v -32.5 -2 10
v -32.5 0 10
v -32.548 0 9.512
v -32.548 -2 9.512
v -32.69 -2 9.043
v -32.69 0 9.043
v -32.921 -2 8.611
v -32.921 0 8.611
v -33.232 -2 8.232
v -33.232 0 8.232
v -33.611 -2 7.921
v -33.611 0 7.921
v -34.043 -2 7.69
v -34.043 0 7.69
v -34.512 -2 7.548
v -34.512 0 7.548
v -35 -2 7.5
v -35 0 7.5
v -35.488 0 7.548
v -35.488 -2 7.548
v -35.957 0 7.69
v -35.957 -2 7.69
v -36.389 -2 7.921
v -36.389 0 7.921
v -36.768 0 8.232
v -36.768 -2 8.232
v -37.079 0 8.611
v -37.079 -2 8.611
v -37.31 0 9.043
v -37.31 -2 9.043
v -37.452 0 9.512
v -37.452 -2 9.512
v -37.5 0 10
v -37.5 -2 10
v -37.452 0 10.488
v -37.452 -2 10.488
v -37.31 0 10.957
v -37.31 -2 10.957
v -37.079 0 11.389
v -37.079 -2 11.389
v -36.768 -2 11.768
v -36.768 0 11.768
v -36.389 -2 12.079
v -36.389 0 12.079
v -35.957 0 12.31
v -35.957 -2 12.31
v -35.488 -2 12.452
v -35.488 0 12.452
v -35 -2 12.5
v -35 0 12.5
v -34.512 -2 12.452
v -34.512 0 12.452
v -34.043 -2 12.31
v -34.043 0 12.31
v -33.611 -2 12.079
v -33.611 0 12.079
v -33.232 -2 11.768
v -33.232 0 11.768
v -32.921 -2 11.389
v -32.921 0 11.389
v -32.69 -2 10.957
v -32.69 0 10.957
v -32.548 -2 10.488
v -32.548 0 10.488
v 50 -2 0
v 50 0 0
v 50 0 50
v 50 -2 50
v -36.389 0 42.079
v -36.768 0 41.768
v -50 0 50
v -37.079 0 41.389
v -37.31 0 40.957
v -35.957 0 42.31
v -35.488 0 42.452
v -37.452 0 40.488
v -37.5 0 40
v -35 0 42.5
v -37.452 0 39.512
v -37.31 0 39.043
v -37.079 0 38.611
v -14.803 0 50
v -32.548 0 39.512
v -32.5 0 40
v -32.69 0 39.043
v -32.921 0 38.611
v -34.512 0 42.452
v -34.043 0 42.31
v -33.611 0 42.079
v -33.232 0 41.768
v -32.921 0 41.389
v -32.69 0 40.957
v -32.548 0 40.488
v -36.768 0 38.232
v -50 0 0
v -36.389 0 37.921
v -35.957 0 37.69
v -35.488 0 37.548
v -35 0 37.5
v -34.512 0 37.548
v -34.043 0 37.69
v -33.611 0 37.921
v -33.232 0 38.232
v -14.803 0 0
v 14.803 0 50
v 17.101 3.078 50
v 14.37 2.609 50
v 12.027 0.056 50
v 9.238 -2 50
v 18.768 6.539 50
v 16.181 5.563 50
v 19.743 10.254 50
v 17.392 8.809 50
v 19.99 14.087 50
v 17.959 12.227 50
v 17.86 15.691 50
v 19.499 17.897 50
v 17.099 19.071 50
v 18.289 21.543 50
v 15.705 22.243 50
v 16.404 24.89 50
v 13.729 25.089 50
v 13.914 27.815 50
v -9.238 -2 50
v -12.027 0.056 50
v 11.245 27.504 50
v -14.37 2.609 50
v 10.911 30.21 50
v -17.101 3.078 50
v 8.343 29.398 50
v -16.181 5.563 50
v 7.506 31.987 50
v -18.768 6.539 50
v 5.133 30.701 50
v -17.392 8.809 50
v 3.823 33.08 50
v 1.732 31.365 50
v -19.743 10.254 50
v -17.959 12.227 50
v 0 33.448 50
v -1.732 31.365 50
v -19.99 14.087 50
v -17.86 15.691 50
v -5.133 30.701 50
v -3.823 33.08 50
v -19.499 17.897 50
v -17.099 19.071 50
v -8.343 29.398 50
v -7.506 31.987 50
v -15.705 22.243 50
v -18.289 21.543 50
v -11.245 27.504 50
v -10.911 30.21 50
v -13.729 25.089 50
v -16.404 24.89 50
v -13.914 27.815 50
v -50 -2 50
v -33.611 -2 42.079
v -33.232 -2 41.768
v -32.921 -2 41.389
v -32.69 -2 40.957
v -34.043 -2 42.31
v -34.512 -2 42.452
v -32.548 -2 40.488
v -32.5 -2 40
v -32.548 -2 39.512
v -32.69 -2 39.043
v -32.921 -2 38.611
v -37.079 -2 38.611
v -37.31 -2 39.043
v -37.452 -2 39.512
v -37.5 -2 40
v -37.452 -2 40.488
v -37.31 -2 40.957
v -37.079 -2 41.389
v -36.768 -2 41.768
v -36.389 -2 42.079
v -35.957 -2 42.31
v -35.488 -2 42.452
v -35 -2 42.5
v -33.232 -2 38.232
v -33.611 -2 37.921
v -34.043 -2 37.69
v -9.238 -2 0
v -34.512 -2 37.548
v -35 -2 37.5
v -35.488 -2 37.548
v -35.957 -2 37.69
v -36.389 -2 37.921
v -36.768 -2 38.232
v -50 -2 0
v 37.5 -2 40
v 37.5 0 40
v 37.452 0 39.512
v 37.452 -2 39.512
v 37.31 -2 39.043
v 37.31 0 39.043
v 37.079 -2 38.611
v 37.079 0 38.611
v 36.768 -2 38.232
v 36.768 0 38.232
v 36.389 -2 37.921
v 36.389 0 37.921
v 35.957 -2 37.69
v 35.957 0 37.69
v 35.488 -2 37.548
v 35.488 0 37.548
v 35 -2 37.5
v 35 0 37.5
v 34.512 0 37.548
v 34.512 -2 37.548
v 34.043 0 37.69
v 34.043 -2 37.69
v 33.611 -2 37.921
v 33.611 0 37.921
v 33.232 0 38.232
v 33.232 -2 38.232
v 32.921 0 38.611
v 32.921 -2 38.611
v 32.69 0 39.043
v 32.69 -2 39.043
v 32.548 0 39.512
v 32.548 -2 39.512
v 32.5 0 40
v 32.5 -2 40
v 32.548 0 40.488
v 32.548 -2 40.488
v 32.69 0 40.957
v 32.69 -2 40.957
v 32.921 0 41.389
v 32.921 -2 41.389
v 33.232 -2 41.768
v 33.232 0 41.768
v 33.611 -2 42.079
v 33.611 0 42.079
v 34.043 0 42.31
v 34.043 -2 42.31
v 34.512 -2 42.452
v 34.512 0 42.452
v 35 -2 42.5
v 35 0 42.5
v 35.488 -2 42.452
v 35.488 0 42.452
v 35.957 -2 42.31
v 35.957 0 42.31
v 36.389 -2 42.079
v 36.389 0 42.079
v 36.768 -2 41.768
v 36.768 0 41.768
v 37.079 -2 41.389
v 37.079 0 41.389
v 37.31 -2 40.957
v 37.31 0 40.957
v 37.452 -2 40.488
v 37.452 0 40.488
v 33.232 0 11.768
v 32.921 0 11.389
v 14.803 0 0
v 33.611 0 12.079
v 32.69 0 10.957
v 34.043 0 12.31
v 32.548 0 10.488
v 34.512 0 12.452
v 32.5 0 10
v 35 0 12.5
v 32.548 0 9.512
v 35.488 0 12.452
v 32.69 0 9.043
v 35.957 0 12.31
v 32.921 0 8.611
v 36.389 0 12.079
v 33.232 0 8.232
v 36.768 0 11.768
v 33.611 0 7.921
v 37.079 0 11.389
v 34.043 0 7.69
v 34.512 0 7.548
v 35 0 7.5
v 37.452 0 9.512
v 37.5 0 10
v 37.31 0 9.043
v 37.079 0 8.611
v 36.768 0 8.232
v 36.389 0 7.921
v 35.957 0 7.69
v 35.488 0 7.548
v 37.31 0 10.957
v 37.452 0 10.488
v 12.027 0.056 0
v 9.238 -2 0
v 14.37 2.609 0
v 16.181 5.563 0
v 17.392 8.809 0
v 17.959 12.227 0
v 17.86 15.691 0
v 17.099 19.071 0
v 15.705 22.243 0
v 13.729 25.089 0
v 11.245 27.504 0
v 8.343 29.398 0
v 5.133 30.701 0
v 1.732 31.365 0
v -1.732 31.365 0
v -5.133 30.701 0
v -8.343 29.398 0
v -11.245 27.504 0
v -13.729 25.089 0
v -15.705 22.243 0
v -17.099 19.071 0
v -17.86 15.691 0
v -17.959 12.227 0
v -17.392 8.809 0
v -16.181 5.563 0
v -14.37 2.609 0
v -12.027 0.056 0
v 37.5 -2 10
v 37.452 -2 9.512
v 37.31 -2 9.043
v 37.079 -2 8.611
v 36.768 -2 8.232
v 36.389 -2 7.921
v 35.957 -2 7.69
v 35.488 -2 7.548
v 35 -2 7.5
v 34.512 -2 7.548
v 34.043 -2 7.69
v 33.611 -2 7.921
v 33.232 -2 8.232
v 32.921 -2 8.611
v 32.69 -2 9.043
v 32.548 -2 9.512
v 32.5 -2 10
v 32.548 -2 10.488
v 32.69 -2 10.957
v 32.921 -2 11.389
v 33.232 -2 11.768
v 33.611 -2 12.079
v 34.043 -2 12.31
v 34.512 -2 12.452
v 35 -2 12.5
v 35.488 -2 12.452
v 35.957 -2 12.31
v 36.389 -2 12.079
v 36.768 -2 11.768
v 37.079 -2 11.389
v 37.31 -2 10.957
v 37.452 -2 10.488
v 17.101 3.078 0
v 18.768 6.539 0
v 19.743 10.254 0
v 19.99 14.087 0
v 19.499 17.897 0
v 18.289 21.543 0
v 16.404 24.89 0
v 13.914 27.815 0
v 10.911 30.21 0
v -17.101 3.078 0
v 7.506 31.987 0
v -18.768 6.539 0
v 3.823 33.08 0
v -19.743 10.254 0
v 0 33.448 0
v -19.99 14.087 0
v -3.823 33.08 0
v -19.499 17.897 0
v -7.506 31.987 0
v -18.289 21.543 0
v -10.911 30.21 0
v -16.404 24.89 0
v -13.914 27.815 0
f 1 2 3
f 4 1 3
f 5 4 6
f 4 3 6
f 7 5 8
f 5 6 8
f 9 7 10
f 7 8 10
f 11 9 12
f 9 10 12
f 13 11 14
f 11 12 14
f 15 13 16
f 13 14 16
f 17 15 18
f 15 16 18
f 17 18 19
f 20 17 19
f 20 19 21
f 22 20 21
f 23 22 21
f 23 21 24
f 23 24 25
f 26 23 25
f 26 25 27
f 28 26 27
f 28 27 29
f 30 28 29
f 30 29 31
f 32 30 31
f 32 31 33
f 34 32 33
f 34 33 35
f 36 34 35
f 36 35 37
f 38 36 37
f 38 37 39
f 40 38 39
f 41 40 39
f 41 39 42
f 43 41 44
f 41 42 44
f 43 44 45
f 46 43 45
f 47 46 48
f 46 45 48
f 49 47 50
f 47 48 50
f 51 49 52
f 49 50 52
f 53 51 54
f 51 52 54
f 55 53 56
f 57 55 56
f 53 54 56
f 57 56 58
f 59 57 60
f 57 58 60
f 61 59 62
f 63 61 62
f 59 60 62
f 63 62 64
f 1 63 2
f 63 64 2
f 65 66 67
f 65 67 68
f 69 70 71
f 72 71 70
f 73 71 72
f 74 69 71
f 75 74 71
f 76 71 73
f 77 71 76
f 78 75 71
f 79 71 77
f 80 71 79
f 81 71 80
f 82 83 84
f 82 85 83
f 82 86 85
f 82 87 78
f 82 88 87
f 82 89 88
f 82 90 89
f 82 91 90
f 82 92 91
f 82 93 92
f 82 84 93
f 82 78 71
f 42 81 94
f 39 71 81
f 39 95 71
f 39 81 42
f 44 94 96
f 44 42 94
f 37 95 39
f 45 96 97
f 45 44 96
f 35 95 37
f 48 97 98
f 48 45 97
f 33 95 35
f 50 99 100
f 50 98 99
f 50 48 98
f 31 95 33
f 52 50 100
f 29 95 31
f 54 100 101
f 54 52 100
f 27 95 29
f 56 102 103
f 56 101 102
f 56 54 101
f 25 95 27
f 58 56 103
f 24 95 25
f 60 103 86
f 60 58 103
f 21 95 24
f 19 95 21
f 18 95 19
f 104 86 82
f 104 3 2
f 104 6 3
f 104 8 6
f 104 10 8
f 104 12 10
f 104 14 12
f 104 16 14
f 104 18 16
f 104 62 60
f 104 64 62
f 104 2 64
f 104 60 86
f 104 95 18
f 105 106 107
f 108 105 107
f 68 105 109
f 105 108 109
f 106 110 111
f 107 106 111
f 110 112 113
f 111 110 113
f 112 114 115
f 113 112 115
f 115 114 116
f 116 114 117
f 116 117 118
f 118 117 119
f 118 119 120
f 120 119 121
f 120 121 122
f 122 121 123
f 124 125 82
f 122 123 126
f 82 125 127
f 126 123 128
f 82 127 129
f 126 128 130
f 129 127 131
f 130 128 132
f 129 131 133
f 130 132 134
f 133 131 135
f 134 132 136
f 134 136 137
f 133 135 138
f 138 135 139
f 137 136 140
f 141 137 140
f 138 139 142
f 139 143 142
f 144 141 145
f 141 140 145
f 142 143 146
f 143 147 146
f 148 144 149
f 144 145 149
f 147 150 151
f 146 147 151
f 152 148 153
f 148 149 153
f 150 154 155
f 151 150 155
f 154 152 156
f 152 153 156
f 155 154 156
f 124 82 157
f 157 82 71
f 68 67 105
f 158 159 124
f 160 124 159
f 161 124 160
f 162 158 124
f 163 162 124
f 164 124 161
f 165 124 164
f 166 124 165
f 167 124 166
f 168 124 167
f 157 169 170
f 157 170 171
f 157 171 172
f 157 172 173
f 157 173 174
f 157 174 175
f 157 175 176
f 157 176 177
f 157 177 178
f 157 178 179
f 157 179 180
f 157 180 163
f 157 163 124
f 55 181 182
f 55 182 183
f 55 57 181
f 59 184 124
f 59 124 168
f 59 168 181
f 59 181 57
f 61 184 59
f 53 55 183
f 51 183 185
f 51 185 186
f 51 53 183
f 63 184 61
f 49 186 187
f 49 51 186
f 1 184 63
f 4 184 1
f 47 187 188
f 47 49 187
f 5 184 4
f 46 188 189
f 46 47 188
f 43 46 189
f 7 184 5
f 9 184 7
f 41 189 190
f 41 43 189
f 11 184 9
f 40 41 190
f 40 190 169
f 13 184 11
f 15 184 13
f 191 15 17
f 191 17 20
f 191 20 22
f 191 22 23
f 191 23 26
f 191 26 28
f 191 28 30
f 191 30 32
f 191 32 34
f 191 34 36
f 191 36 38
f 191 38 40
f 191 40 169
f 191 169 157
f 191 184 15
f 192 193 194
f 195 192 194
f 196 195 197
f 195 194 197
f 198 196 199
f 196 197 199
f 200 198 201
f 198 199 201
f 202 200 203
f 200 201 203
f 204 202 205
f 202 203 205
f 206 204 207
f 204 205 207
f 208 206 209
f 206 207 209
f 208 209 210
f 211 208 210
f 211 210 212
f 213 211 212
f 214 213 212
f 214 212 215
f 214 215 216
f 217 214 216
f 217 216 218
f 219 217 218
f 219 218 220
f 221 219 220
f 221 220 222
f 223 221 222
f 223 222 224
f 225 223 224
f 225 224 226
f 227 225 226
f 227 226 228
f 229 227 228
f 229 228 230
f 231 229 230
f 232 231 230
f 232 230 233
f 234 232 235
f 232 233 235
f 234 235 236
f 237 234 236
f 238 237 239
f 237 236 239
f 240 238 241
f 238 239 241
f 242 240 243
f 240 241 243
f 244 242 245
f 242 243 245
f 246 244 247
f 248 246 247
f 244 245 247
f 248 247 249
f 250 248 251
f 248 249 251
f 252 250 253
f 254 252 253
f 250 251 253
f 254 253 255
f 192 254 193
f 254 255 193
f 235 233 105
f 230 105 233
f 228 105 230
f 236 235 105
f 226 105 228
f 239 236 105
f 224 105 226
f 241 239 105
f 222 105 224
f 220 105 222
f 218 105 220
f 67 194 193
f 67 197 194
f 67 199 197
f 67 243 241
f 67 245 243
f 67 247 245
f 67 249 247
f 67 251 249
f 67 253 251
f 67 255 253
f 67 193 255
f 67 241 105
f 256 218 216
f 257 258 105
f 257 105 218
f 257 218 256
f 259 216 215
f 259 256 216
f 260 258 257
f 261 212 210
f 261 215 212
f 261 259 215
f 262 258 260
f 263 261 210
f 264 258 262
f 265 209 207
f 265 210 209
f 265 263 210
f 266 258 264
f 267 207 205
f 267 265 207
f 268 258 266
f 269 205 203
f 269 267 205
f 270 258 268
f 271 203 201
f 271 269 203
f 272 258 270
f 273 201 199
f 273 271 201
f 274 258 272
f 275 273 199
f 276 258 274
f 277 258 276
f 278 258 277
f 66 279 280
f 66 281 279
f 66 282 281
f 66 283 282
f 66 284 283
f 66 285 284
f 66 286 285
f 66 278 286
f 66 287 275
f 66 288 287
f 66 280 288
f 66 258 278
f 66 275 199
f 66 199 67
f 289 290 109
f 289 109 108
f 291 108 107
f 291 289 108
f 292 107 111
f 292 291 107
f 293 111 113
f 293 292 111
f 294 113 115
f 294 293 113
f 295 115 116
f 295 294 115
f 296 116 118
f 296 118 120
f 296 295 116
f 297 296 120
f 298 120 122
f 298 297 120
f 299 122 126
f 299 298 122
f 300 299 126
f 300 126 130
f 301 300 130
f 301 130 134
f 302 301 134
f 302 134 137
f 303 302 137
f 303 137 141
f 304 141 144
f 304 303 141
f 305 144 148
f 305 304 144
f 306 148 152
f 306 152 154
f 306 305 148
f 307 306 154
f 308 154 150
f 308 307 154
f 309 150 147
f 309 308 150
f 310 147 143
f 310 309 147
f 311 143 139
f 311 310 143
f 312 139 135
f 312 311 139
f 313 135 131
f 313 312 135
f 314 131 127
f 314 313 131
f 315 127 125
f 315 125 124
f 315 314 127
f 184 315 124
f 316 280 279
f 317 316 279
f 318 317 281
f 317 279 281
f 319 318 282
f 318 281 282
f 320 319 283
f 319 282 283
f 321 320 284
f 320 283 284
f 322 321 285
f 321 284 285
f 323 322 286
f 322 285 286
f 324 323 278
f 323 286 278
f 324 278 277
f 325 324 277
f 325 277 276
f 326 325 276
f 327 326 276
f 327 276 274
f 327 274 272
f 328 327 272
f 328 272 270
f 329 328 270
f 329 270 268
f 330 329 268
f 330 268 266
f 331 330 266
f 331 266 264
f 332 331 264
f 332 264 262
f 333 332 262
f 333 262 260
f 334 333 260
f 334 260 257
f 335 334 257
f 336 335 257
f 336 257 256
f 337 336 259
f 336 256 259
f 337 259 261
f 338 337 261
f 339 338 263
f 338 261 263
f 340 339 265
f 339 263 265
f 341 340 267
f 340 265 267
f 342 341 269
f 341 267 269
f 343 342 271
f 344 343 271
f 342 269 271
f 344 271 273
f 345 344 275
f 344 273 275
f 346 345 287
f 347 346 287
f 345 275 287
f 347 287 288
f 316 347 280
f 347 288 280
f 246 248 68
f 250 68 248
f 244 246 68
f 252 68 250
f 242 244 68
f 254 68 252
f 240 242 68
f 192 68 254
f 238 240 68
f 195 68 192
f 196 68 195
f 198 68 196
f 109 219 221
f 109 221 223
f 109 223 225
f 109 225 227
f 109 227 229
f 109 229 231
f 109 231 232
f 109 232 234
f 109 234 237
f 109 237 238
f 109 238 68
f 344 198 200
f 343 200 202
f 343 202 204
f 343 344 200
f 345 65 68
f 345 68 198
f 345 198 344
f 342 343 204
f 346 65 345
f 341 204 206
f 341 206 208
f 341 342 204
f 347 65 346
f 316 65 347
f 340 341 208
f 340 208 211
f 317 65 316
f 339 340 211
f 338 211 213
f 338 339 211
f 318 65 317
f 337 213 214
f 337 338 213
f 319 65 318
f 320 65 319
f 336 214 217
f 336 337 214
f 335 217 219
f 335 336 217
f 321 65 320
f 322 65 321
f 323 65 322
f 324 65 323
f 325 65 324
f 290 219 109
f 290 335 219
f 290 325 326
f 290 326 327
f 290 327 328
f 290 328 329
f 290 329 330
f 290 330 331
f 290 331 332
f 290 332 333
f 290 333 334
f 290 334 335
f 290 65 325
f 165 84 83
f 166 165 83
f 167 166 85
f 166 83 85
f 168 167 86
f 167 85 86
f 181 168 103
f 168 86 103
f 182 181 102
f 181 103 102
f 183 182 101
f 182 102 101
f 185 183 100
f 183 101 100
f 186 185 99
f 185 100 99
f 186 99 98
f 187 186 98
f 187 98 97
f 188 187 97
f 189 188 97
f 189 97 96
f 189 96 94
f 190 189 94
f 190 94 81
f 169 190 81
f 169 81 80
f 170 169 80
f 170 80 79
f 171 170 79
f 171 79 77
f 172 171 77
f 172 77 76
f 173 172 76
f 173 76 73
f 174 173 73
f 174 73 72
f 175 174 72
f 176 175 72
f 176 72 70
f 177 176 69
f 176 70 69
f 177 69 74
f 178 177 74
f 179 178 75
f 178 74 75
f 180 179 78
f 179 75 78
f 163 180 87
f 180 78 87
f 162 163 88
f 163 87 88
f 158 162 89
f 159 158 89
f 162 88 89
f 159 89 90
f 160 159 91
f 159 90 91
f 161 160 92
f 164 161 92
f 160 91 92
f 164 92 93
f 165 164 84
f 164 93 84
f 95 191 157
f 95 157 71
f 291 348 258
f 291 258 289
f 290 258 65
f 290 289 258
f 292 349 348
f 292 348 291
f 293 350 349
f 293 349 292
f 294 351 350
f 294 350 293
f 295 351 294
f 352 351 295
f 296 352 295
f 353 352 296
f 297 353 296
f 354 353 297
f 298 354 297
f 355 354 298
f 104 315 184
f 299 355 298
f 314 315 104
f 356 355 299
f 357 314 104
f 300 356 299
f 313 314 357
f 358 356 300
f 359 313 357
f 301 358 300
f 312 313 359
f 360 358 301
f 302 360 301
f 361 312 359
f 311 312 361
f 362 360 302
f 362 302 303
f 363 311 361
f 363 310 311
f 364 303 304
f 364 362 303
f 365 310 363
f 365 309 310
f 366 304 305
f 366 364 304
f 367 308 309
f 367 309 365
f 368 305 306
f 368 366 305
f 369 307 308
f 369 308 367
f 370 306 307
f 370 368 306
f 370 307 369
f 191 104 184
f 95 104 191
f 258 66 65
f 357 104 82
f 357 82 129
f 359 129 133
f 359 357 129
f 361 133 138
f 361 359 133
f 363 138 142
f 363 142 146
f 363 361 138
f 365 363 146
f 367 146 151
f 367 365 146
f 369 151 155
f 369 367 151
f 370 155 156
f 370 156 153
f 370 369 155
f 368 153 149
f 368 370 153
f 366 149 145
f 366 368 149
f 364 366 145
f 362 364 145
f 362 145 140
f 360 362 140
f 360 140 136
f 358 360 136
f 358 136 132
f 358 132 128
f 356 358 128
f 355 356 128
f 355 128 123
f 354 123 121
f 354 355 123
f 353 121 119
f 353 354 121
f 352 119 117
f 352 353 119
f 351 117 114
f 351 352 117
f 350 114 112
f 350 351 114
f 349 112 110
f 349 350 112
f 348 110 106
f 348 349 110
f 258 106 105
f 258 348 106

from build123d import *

# Parameters (mm, degrees)
BOSS_EXTRUDE2_DEPTH = 50
SKETCH3_R           = 2.5
CUT_EXTRUDE2_DEPTH  = 50


with BuildPart() as part:
    # Sketch1 → Boss-Extrude2 (new body)
    with BuildSketch(Plane.XY):
        with BuildLine():
            Line((-50, 0), (-14.803348106, 0))
            ThreePointArc((-14.803348106, 0), (0, 33.448452879), (14.803348106, 0))
            Line((14.803348106, 0), (50, 0))
            Line((50, 0), (50, -2))
            Line((50, -2), (9.238252196, -2))
            ThreePointArc((9.238252196, -2), (0, 31.448452879), (-9.238252196, -2))
            Line((-9.238252196, -2), (-50, -2))
            Line((-50, -2), (-50, 0))
        make_face()
    extrude(amount=BOSS_EXTRUDE2_DEPTH)

    # Sketch3 → Cut-Extrude2 (cut)
    with BuildSketch(Plane(origin=(0, 0, 0), x_dir=(1, 0, 0), z_dir=(0, 1, 0))):
        with Locations((35, -10)):
            Circle(SKETCH3_R)
        with Locations((35, -40)):
            Circle(SKETCH3_R)
        with Locations((-35, -40)):
            Circle(SKETCH3_R)
        with Locations((-35, -10)):
            Circle(SKETCH3_R)
    extrude(amount=-CUT_EXTRUDE2_DEPTH, mode=Mode.SUBTRACT)


solid = part.part
